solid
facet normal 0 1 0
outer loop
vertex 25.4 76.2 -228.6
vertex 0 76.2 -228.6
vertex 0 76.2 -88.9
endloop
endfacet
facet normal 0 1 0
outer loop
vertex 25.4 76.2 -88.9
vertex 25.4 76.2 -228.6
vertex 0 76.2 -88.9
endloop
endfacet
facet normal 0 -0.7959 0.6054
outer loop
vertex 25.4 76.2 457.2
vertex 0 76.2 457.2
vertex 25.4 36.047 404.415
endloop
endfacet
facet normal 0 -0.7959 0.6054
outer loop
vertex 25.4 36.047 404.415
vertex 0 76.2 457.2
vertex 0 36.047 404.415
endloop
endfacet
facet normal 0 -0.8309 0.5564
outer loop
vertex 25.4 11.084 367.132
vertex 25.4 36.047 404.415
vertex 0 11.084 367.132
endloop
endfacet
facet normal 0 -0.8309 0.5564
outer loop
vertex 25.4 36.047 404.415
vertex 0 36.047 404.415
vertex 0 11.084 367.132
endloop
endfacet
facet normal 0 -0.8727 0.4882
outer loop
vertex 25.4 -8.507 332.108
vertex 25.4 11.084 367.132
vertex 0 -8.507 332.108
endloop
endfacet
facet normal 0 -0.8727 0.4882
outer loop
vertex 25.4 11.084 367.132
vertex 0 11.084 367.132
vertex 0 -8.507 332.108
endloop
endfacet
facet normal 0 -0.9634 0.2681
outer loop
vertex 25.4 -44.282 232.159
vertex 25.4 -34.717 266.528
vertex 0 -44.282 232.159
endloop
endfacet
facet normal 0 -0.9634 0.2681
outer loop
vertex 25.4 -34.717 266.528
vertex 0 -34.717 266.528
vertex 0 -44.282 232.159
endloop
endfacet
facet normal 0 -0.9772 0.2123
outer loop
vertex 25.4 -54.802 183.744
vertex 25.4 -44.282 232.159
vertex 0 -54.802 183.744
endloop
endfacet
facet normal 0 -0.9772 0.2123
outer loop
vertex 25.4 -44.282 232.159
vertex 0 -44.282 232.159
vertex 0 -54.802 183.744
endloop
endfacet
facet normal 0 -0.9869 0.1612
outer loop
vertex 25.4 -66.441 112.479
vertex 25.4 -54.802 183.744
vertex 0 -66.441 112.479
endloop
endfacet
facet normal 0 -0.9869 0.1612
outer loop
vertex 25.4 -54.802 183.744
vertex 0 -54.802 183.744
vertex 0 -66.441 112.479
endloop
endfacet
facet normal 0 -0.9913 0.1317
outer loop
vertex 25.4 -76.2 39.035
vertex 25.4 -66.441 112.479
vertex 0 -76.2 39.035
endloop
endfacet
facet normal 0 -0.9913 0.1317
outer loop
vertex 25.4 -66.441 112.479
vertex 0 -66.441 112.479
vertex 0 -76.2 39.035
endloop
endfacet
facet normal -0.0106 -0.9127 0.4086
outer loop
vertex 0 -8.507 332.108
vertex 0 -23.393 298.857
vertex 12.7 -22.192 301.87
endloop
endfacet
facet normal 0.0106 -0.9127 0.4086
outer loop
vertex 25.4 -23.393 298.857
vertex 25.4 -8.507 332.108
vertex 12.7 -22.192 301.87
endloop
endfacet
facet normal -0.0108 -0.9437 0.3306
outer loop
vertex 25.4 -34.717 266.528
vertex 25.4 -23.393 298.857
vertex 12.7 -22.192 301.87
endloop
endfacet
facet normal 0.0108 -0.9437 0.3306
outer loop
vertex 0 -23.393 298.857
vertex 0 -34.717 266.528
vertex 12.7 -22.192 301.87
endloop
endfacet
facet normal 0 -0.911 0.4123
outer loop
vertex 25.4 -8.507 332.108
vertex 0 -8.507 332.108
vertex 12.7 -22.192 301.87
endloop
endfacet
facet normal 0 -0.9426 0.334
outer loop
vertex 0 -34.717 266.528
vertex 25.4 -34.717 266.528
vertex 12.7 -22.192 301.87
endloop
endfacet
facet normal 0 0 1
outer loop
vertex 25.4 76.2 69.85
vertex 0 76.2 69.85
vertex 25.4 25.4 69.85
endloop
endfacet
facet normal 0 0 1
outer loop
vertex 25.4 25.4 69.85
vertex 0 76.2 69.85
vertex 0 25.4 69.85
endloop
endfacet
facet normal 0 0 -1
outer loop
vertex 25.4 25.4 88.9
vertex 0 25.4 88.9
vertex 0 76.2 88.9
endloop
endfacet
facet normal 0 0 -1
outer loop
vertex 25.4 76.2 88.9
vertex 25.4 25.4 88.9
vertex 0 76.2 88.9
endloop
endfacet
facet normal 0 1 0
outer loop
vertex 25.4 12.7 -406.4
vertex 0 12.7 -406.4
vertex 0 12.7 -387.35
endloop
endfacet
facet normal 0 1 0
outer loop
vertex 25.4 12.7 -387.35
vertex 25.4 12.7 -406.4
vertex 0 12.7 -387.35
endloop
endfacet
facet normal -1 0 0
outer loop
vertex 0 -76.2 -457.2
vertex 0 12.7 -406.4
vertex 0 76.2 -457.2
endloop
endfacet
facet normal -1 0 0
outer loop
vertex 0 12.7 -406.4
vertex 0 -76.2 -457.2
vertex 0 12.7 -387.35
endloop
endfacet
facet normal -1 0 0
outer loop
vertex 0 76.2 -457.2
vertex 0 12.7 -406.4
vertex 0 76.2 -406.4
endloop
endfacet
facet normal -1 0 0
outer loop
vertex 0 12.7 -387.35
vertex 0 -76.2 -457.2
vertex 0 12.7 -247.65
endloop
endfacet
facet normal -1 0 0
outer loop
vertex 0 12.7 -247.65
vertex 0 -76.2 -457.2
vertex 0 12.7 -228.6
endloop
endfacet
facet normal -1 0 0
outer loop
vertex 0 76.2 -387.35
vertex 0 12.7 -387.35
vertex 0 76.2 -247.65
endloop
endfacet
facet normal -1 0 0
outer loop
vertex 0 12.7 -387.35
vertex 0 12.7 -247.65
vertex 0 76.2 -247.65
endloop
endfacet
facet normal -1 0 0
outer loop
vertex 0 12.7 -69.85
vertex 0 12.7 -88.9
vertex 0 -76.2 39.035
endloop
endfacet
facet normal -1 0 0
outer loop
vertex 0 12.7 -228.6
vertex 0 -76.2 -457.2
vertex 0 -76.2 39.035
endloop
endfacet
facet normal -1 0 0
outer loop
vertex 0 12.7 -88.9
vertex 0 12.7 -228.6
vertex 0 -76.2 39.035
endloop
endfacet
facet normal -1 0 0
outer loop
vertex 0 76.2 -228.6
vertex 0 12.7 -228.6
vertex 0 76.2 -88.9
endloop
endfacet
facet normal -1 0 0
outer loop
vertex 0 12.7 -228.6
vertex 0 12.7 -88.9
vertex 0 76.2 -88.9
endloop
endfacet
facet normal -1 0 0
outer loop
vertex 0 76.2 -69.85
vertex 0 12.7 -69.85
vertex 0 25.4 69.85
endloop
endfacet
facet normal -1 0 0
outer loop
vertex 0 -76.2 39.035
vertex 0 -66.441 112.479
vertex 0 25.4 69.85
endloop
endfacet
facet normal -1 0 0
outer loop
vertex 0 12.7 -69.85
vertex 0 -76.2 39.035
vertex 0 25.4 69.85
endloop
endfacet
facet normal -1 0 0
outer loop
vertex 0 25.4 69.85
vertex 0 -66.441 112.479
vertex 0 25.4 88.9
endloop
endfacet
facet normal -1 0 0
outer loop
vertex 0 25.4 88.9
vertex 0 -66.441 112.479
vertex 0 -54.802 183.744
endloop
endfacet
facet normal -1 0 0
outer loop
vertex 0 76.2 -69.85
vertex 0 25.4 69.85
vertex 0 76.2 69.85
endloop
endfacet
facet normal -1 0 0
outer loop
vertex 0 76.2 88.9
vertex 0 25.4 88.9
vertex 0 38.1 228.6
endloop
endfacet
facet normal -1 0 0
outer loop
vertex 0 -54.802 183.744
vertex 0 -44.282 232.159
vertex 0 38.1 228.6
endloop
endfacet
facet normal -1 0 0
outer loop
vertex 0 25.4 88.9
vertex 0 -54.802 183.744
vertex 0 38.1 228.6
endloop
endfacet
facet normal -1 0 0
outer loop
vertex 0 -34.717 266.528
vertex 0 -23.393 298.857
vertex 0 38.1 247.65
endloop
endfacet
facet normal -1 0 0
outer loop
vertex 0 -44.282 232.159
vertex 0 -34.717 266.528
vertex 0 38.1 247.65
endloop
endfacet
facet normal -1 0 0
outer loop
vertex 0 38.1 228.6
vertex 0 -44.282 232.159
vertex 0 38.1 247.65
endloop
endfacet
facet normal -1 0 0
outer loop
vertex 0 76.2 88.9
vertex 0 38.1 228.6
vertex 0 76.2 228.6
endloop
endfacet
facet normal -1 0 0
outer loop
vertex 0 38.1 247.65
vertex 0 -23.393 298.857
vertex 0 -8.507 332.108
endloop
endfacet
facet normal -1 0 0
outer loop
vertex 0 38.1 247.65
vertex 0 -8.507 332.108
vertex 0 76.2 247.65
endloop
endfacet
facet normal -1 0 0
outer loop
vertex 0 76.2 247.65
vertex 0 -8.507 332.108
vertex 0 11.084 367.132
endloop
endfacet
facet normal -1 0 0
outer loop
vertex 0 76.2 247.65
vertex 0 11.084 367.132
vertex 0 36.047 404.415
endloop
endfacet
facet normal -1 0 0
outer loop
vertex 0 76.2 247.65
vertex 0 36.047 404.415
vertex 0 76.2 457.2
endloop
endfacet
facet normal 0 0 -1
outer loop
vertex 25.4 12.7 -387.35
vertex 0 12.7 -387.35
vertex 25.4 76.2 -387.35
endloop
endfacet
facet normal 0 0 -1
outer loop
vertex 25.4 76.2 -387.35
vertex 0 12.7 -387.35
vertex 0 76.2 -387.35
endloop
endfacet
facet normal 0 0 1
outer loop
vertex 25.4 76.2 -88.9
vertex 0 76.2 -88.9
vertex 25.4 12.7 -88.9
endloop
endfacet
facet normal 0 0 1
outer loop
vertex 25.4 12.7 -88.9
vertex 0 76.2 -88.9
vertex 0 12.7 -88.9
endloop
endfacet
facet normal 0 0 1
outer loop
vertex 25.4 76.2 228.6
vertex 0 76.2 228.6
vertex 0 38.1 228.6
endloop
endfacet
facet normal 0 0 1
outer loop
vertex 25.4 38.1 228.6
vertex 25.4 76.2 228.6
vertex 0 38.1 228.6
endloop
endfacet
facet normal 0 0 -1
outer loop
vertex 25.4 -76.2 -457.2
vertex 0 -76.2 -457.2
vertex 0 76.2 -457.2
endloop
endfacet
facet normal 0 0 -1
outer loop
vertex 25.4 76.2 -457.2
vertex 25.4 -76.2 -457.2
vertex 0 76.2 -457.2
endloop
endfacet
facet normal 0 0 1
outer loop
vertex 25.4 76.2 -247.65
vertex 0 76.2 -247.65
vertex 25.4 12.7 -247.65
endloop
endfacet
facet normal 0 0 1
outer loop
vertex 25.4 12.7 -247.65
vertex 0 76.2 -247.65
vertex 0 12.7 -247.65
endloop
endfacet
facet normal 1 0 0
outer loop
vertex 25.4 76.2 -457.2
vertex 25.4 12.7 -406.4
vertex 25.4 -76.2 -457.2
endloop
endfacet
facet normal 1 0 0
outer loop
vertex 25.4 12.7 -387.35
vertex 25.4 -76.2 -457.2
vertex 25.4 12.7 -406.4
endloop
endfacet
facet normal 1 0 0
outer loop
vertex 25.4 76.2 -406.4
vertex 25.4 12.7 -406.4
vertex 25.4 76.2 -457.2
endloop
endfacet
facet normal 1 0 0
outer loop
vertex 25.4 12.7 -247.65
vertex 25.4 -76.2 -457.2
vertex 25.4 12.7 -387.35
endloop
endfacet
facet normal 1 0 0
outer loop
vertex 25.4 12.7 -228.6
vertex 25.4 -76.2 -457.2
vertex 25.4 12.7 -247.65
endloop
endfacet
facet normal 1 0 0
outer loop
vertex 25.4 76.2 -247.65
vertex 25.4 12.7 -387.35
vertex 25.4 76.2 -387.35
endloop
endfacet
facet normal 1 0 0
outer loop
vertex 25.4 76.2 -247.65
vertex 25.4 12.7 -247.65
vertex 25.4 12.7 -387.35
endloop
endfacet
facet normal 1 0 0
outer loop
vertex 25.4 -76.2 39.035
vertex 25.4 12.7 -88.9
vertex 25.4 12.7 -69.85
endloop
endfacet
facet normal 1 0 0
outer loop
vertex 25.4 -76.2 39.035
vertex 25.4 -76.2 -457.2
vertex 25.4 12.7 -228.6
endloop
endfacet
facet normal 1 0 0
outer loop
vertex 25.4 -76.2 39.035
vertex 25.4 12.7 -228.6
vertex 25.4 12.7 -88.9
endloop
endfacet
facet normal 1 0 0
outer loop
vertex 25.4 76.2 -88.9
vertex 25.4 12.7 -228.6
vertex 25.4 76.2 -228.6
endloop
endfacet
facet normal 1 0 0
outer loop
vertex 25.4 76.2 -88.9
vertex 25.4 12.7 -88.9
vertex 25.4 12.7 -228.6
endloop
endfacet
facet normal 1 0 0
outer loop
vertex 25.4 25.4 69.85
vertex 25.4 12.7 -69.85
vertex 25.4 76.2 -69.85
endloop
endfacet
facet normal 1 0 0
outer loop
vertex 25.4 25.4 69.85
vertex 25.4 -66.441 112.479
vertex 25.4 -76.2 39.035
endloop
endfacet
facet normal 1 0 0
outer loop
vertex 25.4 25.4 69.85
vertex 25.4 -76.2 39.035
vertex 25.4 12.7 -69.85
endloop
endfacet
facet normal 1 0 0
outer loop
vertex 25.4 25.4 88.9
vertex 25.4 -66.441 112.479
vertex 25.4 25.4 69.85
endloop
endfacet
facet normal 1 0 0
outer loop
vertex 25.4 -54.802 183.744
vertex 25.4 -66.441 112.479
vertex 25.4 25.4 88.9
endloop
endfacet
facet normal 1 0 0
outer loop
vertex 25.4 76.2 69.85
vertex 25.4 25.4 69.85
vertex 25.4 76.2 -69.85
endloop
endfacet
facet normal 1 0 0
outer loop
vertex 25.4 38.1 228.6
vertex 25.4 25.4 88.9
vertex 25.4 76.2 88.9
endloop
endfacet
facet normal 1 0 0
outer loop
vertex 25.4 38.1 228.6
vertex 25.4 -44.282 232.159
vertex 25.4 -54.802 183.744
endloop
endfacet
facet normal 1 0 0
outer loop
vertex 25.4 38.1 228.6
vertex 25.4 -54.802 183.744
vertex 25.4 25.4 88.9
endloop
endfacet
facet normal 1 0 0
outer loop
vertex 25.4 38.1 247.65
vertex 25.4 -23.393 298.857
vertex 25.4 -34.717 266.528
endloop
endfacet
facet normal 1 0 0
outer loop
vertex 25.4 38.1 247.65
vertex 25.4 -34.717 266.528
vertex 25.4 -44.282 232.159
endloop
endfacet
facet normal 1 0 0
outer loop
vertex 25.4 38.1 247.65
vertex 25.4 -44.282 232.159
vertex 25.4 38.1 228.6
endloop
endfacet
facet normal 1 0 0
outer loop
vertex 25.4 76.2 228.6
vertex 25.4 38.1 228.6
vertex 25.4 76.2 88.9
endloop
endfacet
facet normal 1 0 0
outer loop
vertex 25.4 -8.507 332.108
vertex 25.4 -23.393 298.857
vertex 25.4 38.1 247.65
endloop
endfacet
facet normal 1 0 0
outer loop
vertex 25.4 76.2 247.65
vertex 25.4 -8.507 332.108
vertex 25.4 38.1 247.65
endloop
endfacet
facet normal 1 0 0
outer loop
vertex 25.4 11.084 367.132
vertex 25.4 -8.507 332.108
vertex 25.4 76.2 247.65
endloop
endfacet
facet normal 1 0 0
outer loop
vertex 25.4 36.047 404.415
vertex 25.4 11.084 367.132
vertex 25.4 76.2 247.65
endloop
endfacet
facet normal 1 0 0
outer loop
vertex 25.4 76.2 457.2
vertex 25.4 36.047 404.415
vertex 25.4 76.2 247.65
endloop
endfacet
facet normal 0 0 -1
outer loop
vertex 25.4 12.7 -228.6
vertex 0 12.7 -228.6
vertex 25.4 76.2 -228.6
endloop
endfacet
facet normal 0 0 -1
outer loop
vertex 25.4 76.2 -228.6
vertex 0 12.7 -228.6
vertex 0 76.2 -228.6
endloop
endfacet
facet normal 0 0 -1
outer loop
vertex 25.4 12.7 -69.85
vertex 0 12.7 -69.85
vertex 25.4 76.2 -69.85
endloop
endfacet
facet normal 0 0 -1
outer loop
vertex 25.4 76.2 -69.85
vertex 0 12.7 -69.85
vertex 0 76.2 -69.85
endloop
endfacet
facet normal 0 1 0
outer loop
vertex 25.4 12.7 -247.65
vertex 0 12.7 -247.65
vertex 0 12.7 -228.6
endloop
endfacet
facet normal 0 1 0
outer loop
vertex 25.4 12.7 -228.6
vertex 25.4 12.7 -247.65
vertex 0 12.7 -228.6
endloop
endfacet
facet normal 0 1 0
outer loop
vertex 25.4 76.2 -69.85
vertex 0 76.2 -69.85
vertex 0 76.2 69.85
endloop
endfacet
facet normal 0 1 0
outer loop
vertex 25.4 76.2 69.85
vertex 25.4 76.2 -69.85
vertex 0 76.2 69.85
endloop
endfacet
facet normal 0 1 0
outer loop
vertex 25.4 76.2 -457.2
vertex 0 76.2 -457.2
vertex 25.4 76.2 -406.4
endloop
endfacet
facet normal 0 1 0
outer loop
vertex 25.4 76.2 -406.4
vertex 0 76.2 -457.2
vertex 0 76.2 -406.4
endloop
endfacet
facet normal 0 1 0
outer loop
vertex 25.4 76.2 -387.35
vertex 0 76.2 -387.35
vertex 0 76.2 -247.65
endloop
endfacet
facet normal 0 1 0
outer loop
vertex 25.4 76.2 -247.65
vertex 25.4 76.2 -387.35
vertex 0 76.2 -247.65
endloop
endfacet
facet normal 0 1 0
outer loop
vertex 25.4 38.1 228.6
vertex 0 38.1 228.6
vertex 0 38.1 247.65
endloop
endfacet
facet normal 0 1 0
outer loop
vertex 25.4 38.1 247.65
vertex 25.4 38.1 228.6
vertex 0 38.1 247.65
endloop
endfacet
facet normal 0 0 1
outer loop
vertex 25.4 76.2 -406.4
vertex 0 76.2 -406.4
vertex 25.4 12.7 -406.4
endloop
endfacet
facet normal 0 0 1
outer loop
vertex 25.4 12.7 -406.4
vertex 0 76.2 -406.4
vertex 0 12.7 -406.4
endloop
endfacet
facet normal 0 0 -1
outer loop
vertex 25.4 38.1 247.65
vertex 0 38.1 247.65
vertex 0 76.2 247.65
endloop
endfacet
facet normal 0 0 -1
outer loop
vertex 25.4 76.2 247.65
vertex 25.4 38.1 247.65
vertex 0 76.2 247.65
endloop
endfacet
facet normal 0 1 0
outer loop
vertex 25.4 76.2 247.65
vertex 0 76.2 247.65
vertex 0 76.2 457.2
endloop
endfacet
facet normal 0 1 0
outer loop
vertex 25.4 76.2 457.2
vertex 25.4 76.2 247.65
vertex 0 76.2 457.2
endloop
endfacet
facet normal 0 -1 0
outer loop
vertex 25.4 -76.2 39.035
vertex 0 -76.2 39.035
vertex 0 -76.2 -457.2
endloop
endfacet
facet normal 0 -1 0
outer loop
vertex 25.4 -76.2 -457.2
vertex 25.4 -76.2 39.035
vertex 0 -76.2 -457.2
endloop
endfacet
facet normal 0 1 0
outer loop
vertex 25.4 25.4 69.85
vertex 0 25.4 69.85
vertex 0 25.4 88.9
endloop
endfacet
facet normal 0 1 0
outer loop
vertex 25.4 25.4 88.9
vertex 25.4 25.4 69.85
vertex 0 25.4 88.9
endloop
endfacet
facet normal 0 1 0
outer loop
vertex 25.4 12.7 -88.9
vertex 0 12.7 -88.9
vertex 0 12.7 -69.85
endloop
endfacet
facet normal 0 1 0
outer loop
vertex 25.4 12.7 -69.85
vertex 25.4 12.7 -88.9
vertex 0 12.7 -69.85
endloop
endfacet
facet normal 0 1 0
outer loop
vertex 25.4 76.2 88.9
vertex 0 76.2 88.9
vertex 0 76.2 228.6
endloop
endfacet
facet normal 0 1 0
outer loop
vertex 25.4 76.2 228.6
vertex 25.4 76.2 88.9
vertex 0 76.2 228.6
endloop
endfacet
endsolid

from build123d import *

# Parameters (mm, degrees)
F1_DEPTH = 25.4


with BuildPart() as f1:
    # F0 (on Right) → F1 (new body)
    with BuildSketch(Plane.YZ):
        with BuildLine():
            Line((-76.2, -457.2), (76.2, -457.2))
            Line((76.2, -457.2), (76.2, -406.4))
            Line((76.2, -406.4), (12.7, -406.4))
            Line((12.7, -406.4), (12.7, -387.35))
            Line((12.7, -387.35), (76.2, -387.35))
            Line((76.2, -387.35), (76.2, -247.65))
            Line((76.2, -247.65), (12.7, -247.65))
            Line((12.7, -247.65), (12.7, -228.6))
            Line((12.7, -228.6), (76.2, -228.6))
            Line((76.2, -228.6), (76.2, -88.9))
            Line((76.2, -88.9), (12.7, -88.9))
            Line((12.7, -88.9), (12.7, -69.85))
            Line((12.7, -69.85), (76.2, -69.85))
            Line((76.2, -69.85), (76.2, 69.85))
            Line((76.2, 69.85), (25.4, 69.85))
            Line((25.4, 69.85), (25.4, 88.9))
            Line((25.4, 88.9), (76.2, 88.9))
            Line((76.2, 88.9), (76.2, 228.6))
            Line((76.2, 228.6), (38.1, 228.6))
            Line((38.1, 228.6), (38.1, 247.65))
            Line((38.1, 247.65), (76.2, 247.65))
            Line((76.2, 247.65), (76.2, 457.2))
            add(Edge.make_bspline(
                [(76.2, 457.2), (39.3506912784, 410.1214823851), (-42.0134510054, 306.1710057379), (-64.1105424211, 133.5026752831), (-76.2, 39.0347465873)],
                knots=[0, 0, 0, 0, 0.4528937157, 1, 1, 1, 1], degree=3))
            Line((-76.2, 39.0347465873), (-76.2, -457.2))
        make_face()
    extrude(amount=F1_DEPTH)


solid = f1.part
